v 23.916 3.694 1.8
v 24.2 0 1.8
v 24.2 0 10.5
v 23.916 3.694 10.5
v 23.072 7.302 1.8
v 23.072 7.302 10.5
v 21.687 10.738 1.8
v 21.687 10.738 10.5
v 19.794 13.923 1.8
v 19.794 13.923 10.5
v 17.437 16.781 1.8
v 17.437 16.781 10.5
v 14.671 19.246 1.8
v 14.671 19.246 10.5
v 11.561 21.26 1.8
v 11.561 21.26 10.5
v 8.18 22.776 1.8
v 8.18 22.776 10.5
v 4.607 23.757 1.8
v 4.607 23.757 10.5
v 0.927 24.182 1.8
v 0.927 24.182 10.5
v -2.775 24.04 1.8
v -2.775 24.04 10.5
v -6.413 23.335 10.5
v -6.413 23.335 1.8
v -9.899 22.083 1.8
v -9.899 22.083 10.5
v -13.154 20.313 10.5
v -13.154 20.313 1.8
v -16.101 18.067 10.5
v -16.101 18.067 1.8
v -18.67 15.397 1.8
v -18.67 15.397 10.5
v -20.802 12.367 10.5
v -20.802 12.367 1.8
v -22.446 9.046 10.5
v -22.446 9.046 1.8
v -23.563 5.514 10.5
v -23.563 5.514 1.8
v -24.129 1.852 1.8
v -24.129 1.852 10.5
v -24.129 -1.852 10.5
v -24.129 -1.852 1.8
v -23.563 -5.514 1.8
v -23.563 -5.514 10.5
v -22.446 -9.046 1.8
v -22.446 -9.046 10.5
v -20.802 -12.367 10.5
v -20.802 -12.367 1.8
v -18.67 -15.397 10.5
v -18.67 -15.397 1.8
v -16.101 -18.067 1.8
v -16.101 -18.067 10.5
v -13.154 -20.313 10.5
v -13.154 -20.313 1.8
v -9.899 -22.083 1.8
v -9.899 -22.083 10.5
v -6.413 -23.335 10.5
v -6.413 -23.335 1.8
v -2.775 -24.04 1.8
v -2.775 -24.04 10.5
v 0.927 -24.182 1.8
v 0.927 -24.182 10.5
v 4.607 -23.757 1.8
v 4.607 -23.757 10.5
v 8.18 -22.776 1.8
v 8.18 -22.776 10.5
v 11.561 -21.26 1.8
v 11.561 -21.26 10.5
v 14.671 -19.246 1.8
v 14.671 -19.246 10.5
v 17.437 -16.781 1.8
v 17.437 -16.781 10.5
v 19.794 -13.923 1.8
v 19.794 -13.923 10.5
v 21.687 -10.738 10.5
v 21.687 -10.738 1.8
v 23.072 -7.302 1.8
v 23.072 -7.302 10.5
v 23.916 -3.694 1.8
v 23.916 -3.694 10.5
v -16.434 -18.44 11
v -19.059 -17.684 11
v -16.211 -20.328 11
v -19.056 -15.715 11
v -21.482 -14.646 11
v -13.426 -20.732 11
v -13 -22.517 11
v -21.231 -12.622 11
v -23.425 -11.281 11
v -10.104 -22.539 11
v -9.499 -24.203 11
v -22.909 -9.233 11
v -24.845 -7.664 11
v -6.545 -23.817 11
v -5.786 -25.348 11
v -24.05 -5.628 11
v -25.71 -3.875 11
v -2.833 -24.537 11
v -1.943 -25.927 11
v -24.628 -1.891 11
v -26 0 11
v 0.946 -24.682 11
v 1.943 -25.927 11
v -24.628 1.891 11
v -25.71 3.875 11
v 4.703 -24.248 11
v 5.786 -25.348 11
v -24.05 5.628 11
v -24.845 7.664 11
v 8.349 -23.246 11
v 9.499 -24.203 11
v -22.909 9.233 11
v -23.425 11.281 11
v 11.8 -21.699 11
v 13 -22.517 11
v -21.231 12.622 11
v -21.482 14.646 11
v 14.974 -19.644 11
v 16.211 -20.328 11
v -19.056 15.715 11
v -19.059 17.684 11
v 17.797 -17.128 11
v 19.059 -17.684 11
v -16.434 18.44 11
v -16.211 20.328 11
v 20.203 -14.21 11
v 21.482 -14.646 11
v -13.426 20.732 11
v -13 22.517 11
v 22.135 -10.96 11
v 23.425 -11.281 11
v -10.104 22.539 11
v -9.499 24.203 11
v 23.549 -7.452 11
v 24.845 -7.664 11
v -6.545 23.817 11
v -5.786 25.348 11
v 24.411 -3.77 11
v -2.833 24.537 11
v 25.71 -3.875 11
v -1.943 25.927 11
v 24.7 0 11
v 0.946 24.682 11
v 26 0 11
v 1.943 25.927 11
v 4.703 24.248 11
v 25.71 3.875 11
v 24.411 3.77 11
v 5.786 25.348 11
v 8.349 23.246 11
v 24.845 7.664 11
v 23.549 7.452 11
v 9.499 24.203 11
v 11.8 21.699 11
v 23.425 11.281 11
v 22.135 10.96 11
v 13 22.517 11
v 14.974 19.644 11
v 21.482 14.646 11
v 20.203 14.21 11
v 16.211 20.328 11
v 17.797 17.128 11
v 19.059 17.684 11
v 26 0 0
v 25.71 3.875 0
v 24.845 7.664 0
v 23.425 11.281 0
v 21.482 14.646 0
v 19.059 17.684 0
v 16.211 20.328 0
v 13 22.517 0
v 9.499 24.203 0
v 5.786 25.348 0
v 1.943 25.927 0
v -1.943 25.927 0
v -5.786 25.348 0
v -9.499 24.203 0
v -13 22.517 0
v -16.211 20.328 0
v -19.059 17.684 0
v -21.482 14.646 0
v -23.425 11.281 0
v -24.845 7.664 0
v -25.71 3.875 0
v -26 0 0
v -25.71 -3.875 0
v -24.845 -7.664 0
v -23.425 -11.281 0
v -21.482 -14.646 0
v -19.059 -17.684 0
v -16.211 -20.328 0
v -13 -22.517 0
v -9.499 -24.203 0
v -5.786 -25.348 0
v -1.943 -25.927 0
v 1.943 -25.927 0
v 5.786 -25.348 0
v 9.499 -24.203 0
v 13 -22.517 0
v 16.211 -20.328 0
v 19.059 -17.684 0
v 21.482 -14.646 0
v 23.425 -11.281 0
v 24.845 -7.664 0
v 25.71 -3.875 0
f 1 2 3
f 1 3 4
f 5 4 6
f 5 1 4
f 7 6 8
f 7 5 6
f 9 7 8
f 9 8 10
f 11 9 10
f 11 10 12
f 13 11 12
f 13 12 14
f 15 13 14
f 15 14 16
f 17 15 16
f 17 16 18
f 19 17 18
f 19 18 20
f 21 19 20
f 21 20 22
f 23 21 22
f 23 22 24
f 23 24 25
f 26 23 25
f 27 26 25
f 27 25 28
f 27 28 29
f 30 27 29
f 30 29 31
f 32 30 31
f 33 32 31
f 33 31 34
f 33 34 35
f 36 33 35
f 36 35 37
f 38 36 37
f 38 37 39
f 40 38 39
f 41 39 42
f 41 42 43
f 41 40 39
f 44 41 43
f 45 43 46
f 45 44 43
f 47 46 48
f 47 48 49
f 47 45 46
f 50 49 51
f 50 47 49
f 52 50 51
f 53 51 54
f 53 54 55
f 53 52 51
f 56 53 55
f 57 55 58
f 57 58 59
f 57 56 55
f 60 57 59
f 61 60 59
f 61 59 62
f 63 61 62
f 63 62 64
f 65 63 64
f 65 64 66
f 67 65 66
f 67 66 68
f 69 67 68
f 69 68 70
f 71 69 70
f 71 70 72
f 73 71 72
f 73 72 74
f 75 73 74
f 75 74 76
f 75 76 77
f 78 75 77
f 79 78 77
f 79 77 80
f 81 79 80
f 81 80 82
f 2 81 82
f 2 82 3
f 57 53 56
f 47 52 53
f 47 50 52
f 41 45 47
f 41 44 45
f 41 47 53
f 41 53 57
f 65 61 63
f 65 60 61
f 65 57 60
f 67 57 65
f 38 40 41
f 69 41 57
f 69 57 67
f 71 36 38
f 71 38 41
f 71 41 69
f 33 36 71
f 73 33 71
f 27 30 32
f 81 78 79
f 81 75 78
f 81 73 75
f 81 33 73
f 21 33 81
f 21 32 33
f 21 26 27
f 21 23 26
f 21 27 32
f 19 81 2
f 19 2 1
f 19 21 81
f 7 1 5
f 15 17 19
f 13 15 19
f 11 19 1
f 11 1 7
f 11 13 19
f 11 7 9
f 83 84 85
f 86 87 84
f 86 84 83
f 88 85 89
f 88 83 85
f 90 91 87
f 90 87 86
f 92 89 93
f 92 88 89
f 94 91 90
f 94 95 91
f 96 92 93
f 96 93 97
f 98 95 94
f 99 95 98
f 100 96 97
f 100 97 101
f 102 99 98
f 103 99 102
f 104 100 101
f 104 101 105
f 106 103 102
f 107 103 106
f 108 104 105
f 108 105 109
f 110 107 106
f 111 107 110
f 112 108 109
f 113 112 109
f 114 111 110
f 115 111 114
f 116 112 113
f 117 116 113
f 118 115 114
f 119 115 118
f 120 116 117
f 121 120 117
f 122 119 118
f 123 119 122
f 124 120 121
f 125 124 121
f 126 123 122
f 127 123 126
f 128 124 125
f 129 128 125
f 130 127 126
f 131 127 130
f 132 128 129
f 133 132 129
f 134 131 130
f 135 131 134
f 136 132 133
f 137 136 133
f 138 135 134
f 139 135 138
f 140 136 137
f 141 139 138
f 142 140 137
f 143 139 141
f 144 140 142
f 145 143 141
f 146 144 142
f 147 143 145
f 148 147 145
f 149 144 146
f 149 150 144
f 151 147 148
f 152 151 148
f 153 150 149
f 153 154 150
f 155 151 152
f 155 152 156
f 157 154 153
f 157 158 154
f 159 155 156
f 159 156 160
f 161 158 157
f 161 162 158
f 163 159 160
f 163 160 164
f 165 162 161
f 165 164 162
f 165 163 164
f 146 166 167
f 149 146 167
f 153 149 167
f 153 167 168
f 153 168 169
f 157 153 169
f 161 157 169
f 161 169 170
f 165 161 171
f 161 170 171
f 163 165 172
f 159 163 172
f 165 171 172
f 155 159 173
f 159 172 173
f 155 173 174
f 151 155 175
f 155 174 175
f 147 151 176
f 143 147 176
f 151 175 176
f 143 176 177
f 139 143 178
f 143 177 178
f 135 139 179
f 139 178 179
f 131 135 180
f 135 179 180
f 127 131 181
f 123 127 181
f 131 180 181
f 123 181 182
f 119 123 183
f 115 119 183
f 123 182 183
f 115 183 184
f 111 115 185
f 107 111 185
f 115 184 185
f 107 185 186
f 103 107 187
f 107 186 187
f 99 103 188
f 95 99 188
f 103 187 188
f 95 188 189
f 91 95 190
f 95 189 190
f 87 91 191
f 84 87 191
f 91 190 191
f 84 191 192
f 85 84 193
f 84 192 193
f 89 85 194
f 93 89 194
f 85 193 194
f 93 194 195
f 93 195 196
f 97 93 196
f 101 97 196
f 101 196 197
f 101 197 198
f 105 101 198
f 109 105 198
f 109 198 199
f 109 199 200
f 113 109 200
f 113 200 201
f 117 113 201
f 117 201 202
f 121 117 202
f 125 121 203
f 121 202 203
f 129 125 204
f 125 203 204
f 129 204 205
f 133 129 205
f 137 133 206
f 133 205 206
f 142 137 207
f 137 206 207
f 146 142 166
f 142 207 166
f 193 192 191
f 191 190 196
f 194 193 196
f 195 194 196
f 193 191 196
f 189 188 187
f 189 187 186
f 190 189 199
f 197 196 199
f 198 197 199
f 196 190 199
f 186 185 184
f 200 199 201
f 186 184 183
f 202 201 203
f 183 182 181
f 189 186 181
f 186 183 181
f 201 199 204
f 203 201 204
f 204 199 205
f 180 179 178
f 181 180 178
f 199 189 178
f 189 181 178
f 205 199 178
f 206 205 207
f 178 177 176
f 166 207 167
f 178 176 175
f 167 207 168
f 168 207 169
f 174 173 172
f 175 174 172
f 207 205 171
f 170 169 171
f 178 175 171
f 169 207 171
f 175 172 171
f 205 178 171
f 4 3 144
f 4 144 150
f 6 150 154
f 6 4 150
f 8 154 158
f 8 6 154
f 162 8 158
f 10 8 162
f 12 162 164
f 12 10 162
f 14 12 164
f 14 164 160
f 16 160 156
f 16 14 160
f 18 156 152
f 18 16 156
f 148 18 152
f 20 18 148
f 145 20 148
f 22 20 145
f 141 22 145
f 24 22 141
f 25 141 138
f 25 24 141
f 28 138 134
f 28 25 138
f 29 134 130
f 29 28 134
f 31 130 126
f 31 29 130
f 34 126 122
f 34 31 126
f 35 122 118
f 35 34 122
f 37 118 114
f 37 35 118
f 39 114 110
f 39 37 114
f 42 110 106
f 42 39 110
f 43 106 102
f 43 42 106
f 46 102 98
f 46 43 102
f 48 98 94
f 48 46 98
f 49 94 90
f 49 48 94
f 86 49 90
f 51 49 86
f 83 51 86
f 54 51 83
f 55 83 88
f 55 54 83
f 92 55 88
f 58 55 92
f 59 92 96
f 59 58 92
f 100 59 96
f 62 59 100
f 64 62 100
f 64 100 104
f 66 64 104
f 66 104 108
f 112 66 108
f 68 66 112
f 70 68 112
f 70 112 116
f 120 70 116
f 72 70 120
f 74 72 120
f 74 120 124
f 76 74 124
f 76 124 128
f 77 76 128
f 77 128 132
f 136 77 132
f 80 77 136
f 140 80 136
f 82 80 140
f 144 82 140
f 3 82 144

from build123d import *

# Parameters (mm, degrees)
F0_R     = 26
F1_DEPTH = 11
F2_T     = -1.8
F3_SIZE  = 0.5


with BuildPart() as f1:
    # F0 (on Top) → F1 (new body)
    with BuildSketch(Plane.XY):
        Circle(F0_R)
    extrude(amount=F1_DEPTH)

    # F2
    f2_openings = [f1.faces().sort_by_distance(p)[0] for p in [
        (0, 0, 11),
    ]]
    offset(amount=F2_T, openings=f2_openings)

    # F3
    f3_edges = [f1.edges().sort_by_distance(p)[0] for p in [
        (-24.2, 0, 11),
    ]]
    chamfer(f3_edges, length=F3_SIZE)


solid = f1.part
